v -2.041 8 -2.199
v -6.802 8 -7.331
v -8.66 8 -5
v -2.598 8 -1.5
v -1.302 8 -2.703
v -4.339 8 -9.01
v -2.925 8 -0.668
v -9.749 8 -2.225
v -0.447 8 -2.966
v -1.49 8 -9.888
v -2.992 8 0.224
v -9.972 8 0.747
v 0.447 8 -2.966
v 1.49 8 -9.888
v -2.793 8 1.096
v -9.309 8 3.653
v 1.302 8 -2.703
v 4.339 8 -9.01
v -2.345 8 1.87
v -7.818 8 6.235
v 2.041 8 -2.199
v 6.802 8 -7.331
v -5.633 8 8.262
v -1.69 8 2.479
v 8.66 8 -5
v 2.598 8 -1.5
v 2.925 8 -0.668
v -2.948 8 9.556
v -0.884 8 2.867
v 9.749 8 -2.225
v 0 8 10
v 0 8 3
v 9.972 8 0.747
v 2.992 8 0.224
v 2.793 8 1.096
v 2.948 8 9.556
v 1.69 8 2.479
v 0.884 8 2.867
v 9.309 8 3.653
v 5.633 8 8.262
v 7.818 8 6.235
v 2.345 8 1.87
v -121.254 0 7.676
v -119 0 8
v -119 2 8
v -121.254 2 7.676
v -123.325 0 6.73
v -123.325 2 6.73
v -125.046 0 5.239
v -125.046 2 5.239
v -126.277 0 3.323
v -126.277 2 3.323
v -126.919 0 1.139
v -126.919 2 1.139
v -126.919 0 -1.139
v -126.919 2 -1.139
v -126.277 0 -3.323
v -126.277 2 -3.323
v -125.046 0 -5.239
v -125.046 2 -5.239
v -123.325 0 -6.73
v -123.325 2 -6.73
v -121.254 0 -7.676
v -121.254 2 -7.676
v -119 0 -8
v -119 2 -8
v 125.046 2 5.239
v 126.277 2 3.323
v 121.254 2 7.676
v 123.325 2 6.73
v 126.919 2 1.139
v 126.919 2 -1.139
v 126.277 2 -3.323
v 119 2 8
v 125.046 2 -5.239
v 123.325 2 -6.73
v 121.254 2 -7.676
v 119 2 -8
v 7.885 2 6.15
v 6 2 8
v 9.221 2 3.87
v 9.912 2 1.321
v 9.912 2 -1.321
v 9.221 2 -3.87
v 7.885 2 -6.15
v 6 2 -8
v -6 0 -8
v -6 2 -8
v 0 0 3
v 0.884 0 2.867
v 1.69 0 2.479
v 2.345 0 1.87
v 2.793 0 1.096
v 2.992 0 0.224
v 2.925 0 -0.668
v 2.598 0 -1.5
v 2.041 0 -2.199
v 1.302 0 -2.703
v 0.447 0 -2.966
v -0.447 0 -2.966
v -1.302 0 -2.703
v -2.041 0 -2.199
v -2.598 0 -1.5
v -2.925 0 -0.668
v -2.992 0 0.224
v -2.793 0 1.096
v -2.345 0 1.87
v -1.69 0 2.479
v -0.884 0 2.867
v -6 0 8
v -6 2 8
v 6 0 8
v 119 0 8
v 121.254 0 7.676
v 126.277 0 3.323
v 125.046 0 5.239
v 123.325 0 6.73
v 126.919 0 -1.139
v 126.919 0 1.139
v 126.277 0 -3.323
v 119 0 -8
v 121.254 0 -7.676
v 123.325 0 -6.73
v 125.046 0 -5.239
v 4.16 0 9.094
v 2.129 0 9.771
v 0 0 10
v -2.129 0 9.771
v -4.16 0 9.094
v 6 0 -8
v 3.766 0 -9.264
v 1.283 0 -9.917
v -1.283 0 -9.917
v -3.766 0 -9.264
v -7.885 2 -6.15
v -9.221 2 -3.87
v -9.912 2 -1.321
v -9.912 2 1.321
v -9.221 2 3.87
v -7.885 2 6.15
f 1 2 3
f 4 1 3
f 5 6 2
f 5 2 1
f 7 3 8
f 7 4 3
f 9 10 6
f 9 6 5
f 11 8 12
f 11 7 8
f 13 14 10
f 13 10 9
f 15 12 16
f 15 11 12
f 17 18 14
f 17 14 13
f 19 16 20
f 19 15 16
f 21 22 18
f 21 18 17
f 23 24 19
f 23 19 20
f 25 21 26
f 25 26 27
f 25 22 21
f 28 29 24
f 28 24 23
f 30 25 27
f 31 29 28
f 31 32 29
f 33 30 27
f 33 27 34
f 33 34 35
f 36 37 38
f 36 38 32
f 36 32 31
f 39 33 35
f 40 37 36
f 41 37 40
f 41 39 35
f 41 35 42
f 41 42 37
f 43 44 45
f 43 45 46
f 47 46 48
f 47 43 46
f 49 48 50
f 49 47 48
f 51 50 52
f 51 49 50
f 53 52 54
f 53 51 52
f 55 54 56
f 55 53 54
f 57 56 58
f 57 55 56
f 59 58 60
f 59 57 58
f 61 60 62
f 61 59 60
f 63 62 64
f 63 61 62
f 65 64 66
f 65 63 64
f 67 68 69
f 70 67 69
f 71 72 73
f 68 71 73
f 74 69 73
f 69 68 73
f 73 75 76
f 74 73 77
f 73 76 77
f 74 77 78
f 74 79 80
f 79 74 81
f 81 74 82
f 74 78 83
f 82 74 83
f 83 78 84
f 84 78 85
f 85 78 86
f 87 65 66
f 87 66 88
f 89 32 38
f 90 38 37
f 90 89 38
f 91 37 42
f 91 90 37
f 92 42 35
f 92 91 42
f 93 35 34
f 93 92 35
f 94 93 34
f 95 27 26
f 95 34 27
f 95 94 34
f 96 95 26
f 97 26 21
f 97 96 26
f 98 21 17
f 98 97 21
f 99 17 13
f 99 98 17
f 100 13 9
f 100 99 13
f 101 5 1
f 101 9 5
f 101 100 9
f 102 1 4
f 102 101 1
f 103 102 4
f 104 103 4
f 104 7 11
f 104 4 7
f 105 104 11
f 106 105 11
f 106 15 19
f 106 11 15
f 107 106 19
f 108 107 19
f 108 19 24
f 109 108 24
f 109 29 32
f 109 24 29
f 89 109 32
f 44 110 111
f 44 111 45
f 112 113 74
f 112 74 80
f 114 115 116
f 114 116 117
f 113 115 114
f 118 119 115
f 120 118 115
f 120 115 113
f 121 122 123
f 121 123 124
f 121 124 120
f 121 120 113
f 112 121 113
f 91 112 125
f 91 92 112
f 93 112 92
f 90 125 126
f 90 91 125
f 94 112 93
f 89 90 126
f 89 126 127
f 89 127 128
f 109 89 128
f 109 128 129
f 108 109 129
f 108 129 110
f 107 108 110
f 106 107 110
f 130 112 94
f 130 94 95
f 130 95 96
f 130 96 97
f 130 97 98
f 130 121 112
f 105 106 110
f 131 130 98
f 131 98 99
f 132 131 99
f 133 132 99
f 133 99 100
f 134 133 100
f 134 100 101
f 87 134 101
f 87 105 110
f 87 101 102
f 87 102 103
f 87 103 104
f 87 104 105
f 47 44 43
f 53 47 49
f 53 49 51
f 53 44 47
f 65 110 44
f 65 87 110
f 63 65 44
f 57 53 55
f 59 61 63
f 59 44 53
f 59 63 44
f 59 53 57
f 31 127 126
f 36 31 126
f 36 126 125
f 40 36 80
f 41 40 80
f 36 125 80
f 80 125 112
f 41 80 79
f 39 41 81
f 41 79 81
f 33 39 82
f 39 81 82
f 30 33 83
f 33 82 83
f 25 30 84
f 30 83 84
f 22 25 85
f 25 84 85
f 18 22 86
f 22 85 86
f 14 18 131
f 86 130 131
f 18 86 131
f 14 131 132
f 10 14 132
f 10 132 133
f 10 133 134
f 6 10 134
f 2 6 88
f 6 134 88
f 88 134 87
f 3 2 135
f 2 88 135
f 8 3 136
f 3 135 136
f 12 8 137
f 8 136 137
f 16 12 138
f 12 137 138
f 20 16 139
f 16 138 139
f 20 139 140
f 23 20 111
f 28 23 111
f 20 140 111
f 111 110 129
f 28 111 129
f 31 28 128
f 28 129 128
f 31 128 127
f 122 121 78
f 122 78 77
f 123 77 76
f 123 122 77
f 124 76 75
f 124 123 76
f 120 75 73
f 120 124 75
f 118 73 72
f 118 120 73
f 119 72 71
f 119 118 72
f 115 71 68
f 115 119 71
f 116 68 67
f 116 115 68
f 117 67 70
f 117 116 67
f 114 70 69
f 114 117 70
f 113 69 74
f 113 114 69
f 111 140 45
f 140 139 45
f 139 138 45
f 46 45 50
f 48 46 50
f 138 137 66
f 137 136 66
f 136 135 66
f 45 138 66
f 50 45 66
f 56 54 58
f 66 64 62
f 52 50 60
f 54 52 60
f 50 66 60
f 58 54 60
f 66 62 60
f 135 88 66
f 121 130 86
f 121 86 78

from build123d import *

# Parameters (mm, degrees)
SKETCH1_R           = 10
BOSS_EXTRUDE1_DEPTH = 8
BOSS_EXTRUDE3_DEPTH = 2
SKETCH6_R           = 3
CUT_EXTRUDE1_DEPTH  = 128.644036288


with BuildPart() as part:
    # Sketch1 → Boss-Extrude1 (new body)
    with BuildSketch(Plane(origin=(0, 0, 0), x_dir=(1, 0, 0), z_dir=(0, 1, 0))):
        Circle(SKETCH1_R)
    extrude(amount=BOSS_EXTRUDE1_DEPTH)

    # Sketch5 → Boss-Extrude3 (add)
    with BuildSketch(Plane(origin=(0, 0, 0), x_dir=(1, 0, 0), z_dir=(0, 1, 0))):
        with BuildLine():
            Line((-119, 8), (119, 8))
            ThreePointArc((119, 8), (127, 0), (119, -8))
            Line((119, -8), (-119, -8))
            ThreePointArc((-119, -8), (-127, 0), (-119, 8))
        make_face()
    extrude(amount=BOSS_EXTRUDE3_DEPTH)

    # Sketch6 → Cut-Extrude1 (cut, through all)
    with BuildSketch(Plane(origin=(0, 0, 0), x_dir=(1, 0, 0), z_dir=(0, 1, 0))):
        Circle(SKETCH6_R)
    extrude(amount=CUT_EXTRUDE1_DEPTH, mode=Mode.SUBTRACT)


solid = part.part
